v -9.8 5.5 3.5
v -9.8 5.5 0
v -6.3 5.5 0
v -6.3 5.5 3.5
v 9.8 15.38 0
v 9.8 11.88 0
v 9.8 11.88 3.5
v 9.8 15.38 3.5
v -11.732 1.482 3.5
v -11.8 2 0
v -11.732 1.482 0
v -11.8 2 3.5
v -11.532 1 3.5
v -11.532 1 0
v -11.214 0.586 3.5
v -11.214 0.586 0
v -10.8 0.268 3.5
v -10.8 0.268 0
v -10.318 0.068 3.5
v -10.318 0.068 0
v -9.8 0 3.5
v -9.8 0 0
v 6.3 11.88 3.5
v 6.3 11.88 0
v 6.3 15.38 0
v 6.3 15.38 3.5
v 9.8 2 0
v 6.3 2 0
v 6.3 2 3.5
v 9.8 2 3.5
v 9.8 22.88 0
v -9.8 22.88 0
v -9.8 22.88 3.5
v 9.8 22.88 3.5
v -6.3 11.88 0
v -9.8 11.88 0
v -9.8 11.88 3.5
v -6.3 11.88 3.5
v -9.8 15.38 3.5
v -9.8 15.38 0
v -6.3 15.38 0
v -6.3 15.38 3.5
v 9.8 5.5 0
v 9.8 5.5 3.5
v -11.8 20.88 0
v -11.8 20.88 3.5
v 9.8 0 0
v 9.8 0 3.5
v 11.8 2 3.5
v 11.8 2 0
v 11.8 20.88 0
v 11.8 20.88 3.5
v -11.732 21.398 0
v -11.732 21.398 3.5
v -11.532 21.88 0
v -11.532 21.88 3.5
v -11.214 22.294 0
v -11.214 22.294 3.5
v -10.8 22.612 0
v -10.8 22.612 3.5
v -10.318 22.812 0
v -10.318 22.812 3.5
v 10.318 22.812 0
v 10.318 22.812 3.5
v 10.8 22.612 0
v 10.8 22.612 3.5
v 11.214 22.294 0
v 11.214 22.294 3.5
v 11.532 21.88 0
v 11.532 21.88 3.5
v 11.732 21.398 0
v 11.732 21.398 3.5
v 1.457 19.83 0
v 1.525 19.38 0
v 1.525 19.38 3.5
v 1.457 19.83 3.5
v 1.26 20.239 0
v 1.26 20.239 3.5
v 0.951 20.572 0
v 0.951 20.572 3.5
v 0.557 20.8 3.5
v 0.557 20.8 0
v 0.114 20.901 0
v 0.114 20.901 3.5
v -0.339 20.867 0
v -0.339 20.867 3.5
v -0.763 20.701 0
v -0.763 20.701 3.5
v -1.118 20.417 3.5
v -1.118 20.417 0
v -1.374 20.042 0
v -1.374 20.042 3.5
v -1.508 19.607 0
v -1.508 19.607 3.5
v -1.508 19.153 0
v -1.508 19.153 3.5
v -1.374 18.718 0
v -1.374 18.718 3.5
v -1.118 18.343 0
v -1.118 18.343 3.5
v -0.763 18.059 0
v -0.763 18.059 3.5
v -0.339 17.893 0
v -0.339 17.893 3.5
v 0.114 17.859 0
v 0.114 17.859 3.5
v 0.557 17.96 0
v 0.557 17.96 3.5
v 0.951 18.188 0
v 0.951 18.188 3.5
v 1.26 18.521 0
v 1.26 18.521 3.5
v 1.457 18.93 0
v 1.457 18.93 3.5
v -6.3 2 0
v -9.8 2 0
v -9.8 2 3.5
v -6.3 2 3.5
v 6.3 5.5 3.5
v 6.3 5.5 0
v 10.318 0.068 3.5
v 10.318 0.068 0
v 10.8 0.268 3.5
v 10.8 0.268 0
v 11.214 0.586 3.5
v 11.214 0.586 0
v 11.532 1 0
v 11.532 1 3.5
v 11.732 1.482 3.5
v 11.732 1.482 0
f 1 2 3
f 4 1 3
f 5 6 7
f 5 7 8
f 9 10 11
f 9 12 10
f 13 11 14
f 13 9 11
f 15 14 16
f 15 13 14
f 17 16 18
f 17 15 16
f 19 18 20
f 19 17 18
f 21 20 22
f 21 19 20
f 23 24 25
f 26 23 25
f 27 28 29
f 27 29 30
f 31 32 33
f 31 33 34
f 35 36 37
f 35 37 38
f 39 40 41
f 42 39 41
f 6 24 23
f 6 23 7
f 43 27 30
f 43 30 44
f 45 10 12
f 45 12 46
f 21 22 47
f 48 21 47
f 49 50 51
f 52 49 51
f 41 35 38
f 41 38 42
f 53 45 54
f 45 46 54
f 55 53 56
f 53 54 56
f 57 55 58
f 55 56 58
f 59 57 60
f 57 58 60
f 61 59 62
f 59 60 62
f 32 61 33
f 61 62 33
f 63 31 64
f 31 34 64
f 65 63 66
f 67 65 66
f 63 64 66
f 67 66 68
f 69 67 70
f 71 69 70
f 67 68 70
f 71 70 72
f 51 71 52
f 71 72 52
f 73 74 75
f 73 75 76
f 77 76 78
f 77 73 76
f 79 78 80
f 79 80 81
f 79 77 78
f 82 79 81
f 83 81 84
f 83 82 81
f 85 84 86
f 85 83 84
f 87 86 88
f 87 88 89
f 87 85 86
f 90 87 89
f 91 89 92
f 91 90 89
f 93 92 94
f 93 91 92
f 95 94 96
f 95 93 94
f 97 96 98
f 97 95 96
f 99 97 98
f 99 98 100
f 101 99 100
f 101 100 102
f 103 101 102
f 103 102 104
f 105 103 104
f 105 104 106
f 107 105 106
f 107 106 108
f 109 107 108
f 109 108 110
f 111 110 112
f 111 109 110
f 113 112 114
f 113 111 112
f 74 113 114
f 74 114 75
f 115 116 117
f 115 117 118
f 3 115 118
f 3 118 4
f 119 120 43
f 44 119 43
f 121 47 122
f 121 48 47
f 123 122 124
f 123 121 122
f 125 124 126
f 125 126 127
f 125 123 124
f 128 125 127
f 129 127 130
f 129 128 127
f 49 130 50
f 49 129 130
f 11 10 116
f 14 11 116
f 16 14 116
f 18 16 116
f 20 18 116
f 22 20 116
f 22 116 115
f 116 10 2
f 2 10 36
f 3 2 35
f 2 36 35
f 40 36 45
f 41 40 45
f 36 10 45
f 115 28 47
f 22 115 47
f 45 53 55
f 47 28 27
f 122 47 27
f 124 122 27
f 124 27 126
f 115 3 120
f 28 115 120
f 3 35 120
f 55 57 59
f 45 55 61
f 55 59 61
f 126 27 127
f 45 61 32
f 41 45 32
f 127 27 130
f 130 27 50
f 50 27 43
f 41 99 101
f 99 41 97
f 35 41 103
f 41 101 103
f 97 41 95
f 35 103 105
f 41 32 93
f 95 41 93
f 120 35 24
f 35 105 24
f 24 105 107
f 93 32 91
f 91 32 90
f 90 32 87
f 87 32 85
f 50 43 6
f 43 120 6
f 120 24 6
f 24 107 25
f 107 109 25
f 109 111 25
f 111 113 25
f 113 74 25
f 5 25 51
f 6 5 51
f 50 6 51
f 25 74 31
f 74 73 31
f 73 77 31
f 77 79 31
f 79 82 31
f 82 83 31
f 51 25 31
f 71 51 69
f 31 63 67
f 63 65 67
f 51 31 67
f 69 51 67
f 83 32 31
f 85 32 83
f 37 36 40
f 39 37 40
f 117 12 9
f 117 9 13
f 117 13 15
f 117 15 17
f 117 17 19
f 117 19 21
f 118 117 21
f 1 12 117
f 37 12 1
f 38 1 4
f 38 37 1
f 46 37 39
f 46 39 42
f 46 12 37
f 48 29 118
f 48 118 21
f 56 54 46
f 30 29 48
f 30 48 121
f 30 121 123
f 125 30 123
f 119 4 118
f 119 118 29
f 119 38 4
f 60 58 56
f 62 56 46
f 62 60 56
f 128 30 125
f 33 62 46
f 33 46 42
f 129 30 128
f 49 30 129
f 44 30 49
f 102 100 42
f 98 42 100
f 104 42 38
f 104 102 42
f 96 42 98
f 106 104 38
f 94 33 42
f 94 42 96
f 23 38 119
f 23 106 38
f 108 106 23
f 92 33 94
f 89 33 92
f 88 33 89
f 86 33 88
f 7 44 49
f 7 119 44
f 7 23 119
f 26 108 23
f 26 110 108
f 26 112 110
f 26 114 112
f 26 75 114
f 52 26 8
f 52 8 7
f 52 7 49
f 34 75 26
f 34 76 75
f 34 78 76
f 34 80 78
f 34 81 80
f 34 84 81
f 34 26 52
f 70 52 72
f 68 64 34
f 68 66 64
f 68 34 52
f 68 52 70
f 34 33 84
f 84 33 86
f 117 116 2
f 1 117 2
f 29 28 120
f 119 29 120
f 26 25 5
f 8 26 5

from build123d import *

# Parameters (mm, degrees)
SKETCH1_W           = 23.6
SKETCH1_H           = 22.88
SKETCH1_R           = 1.525
SKETCH1_W_2         = 3.5
SKETCH1_H_2         = 3.5
BOSS_EXTRUDE1_DEPTH = 3.5
FILLET1_R           = 2


with BuildPart() as part:
    # Sketch1 → Boss-Extrude1 (new body)
    with BuildSketch(Plane.XY):
        with Locations((0, 11.44)):
            Rectangle(SKETCH1_W, SKETCH1_H)
        with Locations((0, 19.38)):
            Circle(SKETCH1_R, mode=Mode.SUBTRACT)
        with Locations((-8.05, 3.75)):
            Rectangle(SKETCH1_W_2, SKETCH1_H_2, mode=Mode.SUBTRACT)
        with Locations((8.05, 3.75)):
            Rectangle(SKETCH1_W_2, SKETCH1_H_2, mode=Mode.SUBTRACT)
        with Locations((8.05, 13.63)):
            Rectangle(SKETCH1_W_2, SKETCH1_H_2, mode=Mode.SUBTRACT)
        with Locations((-8.05, 13.63)):
            Rectangle(SKETCH1_W_2, SKETCH1_H_2, mode=Mode.SUBTRACT)
    extrude(amount=BOSS_EXTRUDE1_DEPTH)

    # Fillet1
    fillet1_edges = [part.edges().sort_by_distance(p)[0] for p in [
        (-11.8, 22.88, 1.75),
        (11.8, 22.88, 1.75),
        (11.8, 0, 1.75),
        (-11.8, 0, 1.75),
    ]]
    fillet(fillet1_edges, radius=FILLET1_R)


solid = part.part
